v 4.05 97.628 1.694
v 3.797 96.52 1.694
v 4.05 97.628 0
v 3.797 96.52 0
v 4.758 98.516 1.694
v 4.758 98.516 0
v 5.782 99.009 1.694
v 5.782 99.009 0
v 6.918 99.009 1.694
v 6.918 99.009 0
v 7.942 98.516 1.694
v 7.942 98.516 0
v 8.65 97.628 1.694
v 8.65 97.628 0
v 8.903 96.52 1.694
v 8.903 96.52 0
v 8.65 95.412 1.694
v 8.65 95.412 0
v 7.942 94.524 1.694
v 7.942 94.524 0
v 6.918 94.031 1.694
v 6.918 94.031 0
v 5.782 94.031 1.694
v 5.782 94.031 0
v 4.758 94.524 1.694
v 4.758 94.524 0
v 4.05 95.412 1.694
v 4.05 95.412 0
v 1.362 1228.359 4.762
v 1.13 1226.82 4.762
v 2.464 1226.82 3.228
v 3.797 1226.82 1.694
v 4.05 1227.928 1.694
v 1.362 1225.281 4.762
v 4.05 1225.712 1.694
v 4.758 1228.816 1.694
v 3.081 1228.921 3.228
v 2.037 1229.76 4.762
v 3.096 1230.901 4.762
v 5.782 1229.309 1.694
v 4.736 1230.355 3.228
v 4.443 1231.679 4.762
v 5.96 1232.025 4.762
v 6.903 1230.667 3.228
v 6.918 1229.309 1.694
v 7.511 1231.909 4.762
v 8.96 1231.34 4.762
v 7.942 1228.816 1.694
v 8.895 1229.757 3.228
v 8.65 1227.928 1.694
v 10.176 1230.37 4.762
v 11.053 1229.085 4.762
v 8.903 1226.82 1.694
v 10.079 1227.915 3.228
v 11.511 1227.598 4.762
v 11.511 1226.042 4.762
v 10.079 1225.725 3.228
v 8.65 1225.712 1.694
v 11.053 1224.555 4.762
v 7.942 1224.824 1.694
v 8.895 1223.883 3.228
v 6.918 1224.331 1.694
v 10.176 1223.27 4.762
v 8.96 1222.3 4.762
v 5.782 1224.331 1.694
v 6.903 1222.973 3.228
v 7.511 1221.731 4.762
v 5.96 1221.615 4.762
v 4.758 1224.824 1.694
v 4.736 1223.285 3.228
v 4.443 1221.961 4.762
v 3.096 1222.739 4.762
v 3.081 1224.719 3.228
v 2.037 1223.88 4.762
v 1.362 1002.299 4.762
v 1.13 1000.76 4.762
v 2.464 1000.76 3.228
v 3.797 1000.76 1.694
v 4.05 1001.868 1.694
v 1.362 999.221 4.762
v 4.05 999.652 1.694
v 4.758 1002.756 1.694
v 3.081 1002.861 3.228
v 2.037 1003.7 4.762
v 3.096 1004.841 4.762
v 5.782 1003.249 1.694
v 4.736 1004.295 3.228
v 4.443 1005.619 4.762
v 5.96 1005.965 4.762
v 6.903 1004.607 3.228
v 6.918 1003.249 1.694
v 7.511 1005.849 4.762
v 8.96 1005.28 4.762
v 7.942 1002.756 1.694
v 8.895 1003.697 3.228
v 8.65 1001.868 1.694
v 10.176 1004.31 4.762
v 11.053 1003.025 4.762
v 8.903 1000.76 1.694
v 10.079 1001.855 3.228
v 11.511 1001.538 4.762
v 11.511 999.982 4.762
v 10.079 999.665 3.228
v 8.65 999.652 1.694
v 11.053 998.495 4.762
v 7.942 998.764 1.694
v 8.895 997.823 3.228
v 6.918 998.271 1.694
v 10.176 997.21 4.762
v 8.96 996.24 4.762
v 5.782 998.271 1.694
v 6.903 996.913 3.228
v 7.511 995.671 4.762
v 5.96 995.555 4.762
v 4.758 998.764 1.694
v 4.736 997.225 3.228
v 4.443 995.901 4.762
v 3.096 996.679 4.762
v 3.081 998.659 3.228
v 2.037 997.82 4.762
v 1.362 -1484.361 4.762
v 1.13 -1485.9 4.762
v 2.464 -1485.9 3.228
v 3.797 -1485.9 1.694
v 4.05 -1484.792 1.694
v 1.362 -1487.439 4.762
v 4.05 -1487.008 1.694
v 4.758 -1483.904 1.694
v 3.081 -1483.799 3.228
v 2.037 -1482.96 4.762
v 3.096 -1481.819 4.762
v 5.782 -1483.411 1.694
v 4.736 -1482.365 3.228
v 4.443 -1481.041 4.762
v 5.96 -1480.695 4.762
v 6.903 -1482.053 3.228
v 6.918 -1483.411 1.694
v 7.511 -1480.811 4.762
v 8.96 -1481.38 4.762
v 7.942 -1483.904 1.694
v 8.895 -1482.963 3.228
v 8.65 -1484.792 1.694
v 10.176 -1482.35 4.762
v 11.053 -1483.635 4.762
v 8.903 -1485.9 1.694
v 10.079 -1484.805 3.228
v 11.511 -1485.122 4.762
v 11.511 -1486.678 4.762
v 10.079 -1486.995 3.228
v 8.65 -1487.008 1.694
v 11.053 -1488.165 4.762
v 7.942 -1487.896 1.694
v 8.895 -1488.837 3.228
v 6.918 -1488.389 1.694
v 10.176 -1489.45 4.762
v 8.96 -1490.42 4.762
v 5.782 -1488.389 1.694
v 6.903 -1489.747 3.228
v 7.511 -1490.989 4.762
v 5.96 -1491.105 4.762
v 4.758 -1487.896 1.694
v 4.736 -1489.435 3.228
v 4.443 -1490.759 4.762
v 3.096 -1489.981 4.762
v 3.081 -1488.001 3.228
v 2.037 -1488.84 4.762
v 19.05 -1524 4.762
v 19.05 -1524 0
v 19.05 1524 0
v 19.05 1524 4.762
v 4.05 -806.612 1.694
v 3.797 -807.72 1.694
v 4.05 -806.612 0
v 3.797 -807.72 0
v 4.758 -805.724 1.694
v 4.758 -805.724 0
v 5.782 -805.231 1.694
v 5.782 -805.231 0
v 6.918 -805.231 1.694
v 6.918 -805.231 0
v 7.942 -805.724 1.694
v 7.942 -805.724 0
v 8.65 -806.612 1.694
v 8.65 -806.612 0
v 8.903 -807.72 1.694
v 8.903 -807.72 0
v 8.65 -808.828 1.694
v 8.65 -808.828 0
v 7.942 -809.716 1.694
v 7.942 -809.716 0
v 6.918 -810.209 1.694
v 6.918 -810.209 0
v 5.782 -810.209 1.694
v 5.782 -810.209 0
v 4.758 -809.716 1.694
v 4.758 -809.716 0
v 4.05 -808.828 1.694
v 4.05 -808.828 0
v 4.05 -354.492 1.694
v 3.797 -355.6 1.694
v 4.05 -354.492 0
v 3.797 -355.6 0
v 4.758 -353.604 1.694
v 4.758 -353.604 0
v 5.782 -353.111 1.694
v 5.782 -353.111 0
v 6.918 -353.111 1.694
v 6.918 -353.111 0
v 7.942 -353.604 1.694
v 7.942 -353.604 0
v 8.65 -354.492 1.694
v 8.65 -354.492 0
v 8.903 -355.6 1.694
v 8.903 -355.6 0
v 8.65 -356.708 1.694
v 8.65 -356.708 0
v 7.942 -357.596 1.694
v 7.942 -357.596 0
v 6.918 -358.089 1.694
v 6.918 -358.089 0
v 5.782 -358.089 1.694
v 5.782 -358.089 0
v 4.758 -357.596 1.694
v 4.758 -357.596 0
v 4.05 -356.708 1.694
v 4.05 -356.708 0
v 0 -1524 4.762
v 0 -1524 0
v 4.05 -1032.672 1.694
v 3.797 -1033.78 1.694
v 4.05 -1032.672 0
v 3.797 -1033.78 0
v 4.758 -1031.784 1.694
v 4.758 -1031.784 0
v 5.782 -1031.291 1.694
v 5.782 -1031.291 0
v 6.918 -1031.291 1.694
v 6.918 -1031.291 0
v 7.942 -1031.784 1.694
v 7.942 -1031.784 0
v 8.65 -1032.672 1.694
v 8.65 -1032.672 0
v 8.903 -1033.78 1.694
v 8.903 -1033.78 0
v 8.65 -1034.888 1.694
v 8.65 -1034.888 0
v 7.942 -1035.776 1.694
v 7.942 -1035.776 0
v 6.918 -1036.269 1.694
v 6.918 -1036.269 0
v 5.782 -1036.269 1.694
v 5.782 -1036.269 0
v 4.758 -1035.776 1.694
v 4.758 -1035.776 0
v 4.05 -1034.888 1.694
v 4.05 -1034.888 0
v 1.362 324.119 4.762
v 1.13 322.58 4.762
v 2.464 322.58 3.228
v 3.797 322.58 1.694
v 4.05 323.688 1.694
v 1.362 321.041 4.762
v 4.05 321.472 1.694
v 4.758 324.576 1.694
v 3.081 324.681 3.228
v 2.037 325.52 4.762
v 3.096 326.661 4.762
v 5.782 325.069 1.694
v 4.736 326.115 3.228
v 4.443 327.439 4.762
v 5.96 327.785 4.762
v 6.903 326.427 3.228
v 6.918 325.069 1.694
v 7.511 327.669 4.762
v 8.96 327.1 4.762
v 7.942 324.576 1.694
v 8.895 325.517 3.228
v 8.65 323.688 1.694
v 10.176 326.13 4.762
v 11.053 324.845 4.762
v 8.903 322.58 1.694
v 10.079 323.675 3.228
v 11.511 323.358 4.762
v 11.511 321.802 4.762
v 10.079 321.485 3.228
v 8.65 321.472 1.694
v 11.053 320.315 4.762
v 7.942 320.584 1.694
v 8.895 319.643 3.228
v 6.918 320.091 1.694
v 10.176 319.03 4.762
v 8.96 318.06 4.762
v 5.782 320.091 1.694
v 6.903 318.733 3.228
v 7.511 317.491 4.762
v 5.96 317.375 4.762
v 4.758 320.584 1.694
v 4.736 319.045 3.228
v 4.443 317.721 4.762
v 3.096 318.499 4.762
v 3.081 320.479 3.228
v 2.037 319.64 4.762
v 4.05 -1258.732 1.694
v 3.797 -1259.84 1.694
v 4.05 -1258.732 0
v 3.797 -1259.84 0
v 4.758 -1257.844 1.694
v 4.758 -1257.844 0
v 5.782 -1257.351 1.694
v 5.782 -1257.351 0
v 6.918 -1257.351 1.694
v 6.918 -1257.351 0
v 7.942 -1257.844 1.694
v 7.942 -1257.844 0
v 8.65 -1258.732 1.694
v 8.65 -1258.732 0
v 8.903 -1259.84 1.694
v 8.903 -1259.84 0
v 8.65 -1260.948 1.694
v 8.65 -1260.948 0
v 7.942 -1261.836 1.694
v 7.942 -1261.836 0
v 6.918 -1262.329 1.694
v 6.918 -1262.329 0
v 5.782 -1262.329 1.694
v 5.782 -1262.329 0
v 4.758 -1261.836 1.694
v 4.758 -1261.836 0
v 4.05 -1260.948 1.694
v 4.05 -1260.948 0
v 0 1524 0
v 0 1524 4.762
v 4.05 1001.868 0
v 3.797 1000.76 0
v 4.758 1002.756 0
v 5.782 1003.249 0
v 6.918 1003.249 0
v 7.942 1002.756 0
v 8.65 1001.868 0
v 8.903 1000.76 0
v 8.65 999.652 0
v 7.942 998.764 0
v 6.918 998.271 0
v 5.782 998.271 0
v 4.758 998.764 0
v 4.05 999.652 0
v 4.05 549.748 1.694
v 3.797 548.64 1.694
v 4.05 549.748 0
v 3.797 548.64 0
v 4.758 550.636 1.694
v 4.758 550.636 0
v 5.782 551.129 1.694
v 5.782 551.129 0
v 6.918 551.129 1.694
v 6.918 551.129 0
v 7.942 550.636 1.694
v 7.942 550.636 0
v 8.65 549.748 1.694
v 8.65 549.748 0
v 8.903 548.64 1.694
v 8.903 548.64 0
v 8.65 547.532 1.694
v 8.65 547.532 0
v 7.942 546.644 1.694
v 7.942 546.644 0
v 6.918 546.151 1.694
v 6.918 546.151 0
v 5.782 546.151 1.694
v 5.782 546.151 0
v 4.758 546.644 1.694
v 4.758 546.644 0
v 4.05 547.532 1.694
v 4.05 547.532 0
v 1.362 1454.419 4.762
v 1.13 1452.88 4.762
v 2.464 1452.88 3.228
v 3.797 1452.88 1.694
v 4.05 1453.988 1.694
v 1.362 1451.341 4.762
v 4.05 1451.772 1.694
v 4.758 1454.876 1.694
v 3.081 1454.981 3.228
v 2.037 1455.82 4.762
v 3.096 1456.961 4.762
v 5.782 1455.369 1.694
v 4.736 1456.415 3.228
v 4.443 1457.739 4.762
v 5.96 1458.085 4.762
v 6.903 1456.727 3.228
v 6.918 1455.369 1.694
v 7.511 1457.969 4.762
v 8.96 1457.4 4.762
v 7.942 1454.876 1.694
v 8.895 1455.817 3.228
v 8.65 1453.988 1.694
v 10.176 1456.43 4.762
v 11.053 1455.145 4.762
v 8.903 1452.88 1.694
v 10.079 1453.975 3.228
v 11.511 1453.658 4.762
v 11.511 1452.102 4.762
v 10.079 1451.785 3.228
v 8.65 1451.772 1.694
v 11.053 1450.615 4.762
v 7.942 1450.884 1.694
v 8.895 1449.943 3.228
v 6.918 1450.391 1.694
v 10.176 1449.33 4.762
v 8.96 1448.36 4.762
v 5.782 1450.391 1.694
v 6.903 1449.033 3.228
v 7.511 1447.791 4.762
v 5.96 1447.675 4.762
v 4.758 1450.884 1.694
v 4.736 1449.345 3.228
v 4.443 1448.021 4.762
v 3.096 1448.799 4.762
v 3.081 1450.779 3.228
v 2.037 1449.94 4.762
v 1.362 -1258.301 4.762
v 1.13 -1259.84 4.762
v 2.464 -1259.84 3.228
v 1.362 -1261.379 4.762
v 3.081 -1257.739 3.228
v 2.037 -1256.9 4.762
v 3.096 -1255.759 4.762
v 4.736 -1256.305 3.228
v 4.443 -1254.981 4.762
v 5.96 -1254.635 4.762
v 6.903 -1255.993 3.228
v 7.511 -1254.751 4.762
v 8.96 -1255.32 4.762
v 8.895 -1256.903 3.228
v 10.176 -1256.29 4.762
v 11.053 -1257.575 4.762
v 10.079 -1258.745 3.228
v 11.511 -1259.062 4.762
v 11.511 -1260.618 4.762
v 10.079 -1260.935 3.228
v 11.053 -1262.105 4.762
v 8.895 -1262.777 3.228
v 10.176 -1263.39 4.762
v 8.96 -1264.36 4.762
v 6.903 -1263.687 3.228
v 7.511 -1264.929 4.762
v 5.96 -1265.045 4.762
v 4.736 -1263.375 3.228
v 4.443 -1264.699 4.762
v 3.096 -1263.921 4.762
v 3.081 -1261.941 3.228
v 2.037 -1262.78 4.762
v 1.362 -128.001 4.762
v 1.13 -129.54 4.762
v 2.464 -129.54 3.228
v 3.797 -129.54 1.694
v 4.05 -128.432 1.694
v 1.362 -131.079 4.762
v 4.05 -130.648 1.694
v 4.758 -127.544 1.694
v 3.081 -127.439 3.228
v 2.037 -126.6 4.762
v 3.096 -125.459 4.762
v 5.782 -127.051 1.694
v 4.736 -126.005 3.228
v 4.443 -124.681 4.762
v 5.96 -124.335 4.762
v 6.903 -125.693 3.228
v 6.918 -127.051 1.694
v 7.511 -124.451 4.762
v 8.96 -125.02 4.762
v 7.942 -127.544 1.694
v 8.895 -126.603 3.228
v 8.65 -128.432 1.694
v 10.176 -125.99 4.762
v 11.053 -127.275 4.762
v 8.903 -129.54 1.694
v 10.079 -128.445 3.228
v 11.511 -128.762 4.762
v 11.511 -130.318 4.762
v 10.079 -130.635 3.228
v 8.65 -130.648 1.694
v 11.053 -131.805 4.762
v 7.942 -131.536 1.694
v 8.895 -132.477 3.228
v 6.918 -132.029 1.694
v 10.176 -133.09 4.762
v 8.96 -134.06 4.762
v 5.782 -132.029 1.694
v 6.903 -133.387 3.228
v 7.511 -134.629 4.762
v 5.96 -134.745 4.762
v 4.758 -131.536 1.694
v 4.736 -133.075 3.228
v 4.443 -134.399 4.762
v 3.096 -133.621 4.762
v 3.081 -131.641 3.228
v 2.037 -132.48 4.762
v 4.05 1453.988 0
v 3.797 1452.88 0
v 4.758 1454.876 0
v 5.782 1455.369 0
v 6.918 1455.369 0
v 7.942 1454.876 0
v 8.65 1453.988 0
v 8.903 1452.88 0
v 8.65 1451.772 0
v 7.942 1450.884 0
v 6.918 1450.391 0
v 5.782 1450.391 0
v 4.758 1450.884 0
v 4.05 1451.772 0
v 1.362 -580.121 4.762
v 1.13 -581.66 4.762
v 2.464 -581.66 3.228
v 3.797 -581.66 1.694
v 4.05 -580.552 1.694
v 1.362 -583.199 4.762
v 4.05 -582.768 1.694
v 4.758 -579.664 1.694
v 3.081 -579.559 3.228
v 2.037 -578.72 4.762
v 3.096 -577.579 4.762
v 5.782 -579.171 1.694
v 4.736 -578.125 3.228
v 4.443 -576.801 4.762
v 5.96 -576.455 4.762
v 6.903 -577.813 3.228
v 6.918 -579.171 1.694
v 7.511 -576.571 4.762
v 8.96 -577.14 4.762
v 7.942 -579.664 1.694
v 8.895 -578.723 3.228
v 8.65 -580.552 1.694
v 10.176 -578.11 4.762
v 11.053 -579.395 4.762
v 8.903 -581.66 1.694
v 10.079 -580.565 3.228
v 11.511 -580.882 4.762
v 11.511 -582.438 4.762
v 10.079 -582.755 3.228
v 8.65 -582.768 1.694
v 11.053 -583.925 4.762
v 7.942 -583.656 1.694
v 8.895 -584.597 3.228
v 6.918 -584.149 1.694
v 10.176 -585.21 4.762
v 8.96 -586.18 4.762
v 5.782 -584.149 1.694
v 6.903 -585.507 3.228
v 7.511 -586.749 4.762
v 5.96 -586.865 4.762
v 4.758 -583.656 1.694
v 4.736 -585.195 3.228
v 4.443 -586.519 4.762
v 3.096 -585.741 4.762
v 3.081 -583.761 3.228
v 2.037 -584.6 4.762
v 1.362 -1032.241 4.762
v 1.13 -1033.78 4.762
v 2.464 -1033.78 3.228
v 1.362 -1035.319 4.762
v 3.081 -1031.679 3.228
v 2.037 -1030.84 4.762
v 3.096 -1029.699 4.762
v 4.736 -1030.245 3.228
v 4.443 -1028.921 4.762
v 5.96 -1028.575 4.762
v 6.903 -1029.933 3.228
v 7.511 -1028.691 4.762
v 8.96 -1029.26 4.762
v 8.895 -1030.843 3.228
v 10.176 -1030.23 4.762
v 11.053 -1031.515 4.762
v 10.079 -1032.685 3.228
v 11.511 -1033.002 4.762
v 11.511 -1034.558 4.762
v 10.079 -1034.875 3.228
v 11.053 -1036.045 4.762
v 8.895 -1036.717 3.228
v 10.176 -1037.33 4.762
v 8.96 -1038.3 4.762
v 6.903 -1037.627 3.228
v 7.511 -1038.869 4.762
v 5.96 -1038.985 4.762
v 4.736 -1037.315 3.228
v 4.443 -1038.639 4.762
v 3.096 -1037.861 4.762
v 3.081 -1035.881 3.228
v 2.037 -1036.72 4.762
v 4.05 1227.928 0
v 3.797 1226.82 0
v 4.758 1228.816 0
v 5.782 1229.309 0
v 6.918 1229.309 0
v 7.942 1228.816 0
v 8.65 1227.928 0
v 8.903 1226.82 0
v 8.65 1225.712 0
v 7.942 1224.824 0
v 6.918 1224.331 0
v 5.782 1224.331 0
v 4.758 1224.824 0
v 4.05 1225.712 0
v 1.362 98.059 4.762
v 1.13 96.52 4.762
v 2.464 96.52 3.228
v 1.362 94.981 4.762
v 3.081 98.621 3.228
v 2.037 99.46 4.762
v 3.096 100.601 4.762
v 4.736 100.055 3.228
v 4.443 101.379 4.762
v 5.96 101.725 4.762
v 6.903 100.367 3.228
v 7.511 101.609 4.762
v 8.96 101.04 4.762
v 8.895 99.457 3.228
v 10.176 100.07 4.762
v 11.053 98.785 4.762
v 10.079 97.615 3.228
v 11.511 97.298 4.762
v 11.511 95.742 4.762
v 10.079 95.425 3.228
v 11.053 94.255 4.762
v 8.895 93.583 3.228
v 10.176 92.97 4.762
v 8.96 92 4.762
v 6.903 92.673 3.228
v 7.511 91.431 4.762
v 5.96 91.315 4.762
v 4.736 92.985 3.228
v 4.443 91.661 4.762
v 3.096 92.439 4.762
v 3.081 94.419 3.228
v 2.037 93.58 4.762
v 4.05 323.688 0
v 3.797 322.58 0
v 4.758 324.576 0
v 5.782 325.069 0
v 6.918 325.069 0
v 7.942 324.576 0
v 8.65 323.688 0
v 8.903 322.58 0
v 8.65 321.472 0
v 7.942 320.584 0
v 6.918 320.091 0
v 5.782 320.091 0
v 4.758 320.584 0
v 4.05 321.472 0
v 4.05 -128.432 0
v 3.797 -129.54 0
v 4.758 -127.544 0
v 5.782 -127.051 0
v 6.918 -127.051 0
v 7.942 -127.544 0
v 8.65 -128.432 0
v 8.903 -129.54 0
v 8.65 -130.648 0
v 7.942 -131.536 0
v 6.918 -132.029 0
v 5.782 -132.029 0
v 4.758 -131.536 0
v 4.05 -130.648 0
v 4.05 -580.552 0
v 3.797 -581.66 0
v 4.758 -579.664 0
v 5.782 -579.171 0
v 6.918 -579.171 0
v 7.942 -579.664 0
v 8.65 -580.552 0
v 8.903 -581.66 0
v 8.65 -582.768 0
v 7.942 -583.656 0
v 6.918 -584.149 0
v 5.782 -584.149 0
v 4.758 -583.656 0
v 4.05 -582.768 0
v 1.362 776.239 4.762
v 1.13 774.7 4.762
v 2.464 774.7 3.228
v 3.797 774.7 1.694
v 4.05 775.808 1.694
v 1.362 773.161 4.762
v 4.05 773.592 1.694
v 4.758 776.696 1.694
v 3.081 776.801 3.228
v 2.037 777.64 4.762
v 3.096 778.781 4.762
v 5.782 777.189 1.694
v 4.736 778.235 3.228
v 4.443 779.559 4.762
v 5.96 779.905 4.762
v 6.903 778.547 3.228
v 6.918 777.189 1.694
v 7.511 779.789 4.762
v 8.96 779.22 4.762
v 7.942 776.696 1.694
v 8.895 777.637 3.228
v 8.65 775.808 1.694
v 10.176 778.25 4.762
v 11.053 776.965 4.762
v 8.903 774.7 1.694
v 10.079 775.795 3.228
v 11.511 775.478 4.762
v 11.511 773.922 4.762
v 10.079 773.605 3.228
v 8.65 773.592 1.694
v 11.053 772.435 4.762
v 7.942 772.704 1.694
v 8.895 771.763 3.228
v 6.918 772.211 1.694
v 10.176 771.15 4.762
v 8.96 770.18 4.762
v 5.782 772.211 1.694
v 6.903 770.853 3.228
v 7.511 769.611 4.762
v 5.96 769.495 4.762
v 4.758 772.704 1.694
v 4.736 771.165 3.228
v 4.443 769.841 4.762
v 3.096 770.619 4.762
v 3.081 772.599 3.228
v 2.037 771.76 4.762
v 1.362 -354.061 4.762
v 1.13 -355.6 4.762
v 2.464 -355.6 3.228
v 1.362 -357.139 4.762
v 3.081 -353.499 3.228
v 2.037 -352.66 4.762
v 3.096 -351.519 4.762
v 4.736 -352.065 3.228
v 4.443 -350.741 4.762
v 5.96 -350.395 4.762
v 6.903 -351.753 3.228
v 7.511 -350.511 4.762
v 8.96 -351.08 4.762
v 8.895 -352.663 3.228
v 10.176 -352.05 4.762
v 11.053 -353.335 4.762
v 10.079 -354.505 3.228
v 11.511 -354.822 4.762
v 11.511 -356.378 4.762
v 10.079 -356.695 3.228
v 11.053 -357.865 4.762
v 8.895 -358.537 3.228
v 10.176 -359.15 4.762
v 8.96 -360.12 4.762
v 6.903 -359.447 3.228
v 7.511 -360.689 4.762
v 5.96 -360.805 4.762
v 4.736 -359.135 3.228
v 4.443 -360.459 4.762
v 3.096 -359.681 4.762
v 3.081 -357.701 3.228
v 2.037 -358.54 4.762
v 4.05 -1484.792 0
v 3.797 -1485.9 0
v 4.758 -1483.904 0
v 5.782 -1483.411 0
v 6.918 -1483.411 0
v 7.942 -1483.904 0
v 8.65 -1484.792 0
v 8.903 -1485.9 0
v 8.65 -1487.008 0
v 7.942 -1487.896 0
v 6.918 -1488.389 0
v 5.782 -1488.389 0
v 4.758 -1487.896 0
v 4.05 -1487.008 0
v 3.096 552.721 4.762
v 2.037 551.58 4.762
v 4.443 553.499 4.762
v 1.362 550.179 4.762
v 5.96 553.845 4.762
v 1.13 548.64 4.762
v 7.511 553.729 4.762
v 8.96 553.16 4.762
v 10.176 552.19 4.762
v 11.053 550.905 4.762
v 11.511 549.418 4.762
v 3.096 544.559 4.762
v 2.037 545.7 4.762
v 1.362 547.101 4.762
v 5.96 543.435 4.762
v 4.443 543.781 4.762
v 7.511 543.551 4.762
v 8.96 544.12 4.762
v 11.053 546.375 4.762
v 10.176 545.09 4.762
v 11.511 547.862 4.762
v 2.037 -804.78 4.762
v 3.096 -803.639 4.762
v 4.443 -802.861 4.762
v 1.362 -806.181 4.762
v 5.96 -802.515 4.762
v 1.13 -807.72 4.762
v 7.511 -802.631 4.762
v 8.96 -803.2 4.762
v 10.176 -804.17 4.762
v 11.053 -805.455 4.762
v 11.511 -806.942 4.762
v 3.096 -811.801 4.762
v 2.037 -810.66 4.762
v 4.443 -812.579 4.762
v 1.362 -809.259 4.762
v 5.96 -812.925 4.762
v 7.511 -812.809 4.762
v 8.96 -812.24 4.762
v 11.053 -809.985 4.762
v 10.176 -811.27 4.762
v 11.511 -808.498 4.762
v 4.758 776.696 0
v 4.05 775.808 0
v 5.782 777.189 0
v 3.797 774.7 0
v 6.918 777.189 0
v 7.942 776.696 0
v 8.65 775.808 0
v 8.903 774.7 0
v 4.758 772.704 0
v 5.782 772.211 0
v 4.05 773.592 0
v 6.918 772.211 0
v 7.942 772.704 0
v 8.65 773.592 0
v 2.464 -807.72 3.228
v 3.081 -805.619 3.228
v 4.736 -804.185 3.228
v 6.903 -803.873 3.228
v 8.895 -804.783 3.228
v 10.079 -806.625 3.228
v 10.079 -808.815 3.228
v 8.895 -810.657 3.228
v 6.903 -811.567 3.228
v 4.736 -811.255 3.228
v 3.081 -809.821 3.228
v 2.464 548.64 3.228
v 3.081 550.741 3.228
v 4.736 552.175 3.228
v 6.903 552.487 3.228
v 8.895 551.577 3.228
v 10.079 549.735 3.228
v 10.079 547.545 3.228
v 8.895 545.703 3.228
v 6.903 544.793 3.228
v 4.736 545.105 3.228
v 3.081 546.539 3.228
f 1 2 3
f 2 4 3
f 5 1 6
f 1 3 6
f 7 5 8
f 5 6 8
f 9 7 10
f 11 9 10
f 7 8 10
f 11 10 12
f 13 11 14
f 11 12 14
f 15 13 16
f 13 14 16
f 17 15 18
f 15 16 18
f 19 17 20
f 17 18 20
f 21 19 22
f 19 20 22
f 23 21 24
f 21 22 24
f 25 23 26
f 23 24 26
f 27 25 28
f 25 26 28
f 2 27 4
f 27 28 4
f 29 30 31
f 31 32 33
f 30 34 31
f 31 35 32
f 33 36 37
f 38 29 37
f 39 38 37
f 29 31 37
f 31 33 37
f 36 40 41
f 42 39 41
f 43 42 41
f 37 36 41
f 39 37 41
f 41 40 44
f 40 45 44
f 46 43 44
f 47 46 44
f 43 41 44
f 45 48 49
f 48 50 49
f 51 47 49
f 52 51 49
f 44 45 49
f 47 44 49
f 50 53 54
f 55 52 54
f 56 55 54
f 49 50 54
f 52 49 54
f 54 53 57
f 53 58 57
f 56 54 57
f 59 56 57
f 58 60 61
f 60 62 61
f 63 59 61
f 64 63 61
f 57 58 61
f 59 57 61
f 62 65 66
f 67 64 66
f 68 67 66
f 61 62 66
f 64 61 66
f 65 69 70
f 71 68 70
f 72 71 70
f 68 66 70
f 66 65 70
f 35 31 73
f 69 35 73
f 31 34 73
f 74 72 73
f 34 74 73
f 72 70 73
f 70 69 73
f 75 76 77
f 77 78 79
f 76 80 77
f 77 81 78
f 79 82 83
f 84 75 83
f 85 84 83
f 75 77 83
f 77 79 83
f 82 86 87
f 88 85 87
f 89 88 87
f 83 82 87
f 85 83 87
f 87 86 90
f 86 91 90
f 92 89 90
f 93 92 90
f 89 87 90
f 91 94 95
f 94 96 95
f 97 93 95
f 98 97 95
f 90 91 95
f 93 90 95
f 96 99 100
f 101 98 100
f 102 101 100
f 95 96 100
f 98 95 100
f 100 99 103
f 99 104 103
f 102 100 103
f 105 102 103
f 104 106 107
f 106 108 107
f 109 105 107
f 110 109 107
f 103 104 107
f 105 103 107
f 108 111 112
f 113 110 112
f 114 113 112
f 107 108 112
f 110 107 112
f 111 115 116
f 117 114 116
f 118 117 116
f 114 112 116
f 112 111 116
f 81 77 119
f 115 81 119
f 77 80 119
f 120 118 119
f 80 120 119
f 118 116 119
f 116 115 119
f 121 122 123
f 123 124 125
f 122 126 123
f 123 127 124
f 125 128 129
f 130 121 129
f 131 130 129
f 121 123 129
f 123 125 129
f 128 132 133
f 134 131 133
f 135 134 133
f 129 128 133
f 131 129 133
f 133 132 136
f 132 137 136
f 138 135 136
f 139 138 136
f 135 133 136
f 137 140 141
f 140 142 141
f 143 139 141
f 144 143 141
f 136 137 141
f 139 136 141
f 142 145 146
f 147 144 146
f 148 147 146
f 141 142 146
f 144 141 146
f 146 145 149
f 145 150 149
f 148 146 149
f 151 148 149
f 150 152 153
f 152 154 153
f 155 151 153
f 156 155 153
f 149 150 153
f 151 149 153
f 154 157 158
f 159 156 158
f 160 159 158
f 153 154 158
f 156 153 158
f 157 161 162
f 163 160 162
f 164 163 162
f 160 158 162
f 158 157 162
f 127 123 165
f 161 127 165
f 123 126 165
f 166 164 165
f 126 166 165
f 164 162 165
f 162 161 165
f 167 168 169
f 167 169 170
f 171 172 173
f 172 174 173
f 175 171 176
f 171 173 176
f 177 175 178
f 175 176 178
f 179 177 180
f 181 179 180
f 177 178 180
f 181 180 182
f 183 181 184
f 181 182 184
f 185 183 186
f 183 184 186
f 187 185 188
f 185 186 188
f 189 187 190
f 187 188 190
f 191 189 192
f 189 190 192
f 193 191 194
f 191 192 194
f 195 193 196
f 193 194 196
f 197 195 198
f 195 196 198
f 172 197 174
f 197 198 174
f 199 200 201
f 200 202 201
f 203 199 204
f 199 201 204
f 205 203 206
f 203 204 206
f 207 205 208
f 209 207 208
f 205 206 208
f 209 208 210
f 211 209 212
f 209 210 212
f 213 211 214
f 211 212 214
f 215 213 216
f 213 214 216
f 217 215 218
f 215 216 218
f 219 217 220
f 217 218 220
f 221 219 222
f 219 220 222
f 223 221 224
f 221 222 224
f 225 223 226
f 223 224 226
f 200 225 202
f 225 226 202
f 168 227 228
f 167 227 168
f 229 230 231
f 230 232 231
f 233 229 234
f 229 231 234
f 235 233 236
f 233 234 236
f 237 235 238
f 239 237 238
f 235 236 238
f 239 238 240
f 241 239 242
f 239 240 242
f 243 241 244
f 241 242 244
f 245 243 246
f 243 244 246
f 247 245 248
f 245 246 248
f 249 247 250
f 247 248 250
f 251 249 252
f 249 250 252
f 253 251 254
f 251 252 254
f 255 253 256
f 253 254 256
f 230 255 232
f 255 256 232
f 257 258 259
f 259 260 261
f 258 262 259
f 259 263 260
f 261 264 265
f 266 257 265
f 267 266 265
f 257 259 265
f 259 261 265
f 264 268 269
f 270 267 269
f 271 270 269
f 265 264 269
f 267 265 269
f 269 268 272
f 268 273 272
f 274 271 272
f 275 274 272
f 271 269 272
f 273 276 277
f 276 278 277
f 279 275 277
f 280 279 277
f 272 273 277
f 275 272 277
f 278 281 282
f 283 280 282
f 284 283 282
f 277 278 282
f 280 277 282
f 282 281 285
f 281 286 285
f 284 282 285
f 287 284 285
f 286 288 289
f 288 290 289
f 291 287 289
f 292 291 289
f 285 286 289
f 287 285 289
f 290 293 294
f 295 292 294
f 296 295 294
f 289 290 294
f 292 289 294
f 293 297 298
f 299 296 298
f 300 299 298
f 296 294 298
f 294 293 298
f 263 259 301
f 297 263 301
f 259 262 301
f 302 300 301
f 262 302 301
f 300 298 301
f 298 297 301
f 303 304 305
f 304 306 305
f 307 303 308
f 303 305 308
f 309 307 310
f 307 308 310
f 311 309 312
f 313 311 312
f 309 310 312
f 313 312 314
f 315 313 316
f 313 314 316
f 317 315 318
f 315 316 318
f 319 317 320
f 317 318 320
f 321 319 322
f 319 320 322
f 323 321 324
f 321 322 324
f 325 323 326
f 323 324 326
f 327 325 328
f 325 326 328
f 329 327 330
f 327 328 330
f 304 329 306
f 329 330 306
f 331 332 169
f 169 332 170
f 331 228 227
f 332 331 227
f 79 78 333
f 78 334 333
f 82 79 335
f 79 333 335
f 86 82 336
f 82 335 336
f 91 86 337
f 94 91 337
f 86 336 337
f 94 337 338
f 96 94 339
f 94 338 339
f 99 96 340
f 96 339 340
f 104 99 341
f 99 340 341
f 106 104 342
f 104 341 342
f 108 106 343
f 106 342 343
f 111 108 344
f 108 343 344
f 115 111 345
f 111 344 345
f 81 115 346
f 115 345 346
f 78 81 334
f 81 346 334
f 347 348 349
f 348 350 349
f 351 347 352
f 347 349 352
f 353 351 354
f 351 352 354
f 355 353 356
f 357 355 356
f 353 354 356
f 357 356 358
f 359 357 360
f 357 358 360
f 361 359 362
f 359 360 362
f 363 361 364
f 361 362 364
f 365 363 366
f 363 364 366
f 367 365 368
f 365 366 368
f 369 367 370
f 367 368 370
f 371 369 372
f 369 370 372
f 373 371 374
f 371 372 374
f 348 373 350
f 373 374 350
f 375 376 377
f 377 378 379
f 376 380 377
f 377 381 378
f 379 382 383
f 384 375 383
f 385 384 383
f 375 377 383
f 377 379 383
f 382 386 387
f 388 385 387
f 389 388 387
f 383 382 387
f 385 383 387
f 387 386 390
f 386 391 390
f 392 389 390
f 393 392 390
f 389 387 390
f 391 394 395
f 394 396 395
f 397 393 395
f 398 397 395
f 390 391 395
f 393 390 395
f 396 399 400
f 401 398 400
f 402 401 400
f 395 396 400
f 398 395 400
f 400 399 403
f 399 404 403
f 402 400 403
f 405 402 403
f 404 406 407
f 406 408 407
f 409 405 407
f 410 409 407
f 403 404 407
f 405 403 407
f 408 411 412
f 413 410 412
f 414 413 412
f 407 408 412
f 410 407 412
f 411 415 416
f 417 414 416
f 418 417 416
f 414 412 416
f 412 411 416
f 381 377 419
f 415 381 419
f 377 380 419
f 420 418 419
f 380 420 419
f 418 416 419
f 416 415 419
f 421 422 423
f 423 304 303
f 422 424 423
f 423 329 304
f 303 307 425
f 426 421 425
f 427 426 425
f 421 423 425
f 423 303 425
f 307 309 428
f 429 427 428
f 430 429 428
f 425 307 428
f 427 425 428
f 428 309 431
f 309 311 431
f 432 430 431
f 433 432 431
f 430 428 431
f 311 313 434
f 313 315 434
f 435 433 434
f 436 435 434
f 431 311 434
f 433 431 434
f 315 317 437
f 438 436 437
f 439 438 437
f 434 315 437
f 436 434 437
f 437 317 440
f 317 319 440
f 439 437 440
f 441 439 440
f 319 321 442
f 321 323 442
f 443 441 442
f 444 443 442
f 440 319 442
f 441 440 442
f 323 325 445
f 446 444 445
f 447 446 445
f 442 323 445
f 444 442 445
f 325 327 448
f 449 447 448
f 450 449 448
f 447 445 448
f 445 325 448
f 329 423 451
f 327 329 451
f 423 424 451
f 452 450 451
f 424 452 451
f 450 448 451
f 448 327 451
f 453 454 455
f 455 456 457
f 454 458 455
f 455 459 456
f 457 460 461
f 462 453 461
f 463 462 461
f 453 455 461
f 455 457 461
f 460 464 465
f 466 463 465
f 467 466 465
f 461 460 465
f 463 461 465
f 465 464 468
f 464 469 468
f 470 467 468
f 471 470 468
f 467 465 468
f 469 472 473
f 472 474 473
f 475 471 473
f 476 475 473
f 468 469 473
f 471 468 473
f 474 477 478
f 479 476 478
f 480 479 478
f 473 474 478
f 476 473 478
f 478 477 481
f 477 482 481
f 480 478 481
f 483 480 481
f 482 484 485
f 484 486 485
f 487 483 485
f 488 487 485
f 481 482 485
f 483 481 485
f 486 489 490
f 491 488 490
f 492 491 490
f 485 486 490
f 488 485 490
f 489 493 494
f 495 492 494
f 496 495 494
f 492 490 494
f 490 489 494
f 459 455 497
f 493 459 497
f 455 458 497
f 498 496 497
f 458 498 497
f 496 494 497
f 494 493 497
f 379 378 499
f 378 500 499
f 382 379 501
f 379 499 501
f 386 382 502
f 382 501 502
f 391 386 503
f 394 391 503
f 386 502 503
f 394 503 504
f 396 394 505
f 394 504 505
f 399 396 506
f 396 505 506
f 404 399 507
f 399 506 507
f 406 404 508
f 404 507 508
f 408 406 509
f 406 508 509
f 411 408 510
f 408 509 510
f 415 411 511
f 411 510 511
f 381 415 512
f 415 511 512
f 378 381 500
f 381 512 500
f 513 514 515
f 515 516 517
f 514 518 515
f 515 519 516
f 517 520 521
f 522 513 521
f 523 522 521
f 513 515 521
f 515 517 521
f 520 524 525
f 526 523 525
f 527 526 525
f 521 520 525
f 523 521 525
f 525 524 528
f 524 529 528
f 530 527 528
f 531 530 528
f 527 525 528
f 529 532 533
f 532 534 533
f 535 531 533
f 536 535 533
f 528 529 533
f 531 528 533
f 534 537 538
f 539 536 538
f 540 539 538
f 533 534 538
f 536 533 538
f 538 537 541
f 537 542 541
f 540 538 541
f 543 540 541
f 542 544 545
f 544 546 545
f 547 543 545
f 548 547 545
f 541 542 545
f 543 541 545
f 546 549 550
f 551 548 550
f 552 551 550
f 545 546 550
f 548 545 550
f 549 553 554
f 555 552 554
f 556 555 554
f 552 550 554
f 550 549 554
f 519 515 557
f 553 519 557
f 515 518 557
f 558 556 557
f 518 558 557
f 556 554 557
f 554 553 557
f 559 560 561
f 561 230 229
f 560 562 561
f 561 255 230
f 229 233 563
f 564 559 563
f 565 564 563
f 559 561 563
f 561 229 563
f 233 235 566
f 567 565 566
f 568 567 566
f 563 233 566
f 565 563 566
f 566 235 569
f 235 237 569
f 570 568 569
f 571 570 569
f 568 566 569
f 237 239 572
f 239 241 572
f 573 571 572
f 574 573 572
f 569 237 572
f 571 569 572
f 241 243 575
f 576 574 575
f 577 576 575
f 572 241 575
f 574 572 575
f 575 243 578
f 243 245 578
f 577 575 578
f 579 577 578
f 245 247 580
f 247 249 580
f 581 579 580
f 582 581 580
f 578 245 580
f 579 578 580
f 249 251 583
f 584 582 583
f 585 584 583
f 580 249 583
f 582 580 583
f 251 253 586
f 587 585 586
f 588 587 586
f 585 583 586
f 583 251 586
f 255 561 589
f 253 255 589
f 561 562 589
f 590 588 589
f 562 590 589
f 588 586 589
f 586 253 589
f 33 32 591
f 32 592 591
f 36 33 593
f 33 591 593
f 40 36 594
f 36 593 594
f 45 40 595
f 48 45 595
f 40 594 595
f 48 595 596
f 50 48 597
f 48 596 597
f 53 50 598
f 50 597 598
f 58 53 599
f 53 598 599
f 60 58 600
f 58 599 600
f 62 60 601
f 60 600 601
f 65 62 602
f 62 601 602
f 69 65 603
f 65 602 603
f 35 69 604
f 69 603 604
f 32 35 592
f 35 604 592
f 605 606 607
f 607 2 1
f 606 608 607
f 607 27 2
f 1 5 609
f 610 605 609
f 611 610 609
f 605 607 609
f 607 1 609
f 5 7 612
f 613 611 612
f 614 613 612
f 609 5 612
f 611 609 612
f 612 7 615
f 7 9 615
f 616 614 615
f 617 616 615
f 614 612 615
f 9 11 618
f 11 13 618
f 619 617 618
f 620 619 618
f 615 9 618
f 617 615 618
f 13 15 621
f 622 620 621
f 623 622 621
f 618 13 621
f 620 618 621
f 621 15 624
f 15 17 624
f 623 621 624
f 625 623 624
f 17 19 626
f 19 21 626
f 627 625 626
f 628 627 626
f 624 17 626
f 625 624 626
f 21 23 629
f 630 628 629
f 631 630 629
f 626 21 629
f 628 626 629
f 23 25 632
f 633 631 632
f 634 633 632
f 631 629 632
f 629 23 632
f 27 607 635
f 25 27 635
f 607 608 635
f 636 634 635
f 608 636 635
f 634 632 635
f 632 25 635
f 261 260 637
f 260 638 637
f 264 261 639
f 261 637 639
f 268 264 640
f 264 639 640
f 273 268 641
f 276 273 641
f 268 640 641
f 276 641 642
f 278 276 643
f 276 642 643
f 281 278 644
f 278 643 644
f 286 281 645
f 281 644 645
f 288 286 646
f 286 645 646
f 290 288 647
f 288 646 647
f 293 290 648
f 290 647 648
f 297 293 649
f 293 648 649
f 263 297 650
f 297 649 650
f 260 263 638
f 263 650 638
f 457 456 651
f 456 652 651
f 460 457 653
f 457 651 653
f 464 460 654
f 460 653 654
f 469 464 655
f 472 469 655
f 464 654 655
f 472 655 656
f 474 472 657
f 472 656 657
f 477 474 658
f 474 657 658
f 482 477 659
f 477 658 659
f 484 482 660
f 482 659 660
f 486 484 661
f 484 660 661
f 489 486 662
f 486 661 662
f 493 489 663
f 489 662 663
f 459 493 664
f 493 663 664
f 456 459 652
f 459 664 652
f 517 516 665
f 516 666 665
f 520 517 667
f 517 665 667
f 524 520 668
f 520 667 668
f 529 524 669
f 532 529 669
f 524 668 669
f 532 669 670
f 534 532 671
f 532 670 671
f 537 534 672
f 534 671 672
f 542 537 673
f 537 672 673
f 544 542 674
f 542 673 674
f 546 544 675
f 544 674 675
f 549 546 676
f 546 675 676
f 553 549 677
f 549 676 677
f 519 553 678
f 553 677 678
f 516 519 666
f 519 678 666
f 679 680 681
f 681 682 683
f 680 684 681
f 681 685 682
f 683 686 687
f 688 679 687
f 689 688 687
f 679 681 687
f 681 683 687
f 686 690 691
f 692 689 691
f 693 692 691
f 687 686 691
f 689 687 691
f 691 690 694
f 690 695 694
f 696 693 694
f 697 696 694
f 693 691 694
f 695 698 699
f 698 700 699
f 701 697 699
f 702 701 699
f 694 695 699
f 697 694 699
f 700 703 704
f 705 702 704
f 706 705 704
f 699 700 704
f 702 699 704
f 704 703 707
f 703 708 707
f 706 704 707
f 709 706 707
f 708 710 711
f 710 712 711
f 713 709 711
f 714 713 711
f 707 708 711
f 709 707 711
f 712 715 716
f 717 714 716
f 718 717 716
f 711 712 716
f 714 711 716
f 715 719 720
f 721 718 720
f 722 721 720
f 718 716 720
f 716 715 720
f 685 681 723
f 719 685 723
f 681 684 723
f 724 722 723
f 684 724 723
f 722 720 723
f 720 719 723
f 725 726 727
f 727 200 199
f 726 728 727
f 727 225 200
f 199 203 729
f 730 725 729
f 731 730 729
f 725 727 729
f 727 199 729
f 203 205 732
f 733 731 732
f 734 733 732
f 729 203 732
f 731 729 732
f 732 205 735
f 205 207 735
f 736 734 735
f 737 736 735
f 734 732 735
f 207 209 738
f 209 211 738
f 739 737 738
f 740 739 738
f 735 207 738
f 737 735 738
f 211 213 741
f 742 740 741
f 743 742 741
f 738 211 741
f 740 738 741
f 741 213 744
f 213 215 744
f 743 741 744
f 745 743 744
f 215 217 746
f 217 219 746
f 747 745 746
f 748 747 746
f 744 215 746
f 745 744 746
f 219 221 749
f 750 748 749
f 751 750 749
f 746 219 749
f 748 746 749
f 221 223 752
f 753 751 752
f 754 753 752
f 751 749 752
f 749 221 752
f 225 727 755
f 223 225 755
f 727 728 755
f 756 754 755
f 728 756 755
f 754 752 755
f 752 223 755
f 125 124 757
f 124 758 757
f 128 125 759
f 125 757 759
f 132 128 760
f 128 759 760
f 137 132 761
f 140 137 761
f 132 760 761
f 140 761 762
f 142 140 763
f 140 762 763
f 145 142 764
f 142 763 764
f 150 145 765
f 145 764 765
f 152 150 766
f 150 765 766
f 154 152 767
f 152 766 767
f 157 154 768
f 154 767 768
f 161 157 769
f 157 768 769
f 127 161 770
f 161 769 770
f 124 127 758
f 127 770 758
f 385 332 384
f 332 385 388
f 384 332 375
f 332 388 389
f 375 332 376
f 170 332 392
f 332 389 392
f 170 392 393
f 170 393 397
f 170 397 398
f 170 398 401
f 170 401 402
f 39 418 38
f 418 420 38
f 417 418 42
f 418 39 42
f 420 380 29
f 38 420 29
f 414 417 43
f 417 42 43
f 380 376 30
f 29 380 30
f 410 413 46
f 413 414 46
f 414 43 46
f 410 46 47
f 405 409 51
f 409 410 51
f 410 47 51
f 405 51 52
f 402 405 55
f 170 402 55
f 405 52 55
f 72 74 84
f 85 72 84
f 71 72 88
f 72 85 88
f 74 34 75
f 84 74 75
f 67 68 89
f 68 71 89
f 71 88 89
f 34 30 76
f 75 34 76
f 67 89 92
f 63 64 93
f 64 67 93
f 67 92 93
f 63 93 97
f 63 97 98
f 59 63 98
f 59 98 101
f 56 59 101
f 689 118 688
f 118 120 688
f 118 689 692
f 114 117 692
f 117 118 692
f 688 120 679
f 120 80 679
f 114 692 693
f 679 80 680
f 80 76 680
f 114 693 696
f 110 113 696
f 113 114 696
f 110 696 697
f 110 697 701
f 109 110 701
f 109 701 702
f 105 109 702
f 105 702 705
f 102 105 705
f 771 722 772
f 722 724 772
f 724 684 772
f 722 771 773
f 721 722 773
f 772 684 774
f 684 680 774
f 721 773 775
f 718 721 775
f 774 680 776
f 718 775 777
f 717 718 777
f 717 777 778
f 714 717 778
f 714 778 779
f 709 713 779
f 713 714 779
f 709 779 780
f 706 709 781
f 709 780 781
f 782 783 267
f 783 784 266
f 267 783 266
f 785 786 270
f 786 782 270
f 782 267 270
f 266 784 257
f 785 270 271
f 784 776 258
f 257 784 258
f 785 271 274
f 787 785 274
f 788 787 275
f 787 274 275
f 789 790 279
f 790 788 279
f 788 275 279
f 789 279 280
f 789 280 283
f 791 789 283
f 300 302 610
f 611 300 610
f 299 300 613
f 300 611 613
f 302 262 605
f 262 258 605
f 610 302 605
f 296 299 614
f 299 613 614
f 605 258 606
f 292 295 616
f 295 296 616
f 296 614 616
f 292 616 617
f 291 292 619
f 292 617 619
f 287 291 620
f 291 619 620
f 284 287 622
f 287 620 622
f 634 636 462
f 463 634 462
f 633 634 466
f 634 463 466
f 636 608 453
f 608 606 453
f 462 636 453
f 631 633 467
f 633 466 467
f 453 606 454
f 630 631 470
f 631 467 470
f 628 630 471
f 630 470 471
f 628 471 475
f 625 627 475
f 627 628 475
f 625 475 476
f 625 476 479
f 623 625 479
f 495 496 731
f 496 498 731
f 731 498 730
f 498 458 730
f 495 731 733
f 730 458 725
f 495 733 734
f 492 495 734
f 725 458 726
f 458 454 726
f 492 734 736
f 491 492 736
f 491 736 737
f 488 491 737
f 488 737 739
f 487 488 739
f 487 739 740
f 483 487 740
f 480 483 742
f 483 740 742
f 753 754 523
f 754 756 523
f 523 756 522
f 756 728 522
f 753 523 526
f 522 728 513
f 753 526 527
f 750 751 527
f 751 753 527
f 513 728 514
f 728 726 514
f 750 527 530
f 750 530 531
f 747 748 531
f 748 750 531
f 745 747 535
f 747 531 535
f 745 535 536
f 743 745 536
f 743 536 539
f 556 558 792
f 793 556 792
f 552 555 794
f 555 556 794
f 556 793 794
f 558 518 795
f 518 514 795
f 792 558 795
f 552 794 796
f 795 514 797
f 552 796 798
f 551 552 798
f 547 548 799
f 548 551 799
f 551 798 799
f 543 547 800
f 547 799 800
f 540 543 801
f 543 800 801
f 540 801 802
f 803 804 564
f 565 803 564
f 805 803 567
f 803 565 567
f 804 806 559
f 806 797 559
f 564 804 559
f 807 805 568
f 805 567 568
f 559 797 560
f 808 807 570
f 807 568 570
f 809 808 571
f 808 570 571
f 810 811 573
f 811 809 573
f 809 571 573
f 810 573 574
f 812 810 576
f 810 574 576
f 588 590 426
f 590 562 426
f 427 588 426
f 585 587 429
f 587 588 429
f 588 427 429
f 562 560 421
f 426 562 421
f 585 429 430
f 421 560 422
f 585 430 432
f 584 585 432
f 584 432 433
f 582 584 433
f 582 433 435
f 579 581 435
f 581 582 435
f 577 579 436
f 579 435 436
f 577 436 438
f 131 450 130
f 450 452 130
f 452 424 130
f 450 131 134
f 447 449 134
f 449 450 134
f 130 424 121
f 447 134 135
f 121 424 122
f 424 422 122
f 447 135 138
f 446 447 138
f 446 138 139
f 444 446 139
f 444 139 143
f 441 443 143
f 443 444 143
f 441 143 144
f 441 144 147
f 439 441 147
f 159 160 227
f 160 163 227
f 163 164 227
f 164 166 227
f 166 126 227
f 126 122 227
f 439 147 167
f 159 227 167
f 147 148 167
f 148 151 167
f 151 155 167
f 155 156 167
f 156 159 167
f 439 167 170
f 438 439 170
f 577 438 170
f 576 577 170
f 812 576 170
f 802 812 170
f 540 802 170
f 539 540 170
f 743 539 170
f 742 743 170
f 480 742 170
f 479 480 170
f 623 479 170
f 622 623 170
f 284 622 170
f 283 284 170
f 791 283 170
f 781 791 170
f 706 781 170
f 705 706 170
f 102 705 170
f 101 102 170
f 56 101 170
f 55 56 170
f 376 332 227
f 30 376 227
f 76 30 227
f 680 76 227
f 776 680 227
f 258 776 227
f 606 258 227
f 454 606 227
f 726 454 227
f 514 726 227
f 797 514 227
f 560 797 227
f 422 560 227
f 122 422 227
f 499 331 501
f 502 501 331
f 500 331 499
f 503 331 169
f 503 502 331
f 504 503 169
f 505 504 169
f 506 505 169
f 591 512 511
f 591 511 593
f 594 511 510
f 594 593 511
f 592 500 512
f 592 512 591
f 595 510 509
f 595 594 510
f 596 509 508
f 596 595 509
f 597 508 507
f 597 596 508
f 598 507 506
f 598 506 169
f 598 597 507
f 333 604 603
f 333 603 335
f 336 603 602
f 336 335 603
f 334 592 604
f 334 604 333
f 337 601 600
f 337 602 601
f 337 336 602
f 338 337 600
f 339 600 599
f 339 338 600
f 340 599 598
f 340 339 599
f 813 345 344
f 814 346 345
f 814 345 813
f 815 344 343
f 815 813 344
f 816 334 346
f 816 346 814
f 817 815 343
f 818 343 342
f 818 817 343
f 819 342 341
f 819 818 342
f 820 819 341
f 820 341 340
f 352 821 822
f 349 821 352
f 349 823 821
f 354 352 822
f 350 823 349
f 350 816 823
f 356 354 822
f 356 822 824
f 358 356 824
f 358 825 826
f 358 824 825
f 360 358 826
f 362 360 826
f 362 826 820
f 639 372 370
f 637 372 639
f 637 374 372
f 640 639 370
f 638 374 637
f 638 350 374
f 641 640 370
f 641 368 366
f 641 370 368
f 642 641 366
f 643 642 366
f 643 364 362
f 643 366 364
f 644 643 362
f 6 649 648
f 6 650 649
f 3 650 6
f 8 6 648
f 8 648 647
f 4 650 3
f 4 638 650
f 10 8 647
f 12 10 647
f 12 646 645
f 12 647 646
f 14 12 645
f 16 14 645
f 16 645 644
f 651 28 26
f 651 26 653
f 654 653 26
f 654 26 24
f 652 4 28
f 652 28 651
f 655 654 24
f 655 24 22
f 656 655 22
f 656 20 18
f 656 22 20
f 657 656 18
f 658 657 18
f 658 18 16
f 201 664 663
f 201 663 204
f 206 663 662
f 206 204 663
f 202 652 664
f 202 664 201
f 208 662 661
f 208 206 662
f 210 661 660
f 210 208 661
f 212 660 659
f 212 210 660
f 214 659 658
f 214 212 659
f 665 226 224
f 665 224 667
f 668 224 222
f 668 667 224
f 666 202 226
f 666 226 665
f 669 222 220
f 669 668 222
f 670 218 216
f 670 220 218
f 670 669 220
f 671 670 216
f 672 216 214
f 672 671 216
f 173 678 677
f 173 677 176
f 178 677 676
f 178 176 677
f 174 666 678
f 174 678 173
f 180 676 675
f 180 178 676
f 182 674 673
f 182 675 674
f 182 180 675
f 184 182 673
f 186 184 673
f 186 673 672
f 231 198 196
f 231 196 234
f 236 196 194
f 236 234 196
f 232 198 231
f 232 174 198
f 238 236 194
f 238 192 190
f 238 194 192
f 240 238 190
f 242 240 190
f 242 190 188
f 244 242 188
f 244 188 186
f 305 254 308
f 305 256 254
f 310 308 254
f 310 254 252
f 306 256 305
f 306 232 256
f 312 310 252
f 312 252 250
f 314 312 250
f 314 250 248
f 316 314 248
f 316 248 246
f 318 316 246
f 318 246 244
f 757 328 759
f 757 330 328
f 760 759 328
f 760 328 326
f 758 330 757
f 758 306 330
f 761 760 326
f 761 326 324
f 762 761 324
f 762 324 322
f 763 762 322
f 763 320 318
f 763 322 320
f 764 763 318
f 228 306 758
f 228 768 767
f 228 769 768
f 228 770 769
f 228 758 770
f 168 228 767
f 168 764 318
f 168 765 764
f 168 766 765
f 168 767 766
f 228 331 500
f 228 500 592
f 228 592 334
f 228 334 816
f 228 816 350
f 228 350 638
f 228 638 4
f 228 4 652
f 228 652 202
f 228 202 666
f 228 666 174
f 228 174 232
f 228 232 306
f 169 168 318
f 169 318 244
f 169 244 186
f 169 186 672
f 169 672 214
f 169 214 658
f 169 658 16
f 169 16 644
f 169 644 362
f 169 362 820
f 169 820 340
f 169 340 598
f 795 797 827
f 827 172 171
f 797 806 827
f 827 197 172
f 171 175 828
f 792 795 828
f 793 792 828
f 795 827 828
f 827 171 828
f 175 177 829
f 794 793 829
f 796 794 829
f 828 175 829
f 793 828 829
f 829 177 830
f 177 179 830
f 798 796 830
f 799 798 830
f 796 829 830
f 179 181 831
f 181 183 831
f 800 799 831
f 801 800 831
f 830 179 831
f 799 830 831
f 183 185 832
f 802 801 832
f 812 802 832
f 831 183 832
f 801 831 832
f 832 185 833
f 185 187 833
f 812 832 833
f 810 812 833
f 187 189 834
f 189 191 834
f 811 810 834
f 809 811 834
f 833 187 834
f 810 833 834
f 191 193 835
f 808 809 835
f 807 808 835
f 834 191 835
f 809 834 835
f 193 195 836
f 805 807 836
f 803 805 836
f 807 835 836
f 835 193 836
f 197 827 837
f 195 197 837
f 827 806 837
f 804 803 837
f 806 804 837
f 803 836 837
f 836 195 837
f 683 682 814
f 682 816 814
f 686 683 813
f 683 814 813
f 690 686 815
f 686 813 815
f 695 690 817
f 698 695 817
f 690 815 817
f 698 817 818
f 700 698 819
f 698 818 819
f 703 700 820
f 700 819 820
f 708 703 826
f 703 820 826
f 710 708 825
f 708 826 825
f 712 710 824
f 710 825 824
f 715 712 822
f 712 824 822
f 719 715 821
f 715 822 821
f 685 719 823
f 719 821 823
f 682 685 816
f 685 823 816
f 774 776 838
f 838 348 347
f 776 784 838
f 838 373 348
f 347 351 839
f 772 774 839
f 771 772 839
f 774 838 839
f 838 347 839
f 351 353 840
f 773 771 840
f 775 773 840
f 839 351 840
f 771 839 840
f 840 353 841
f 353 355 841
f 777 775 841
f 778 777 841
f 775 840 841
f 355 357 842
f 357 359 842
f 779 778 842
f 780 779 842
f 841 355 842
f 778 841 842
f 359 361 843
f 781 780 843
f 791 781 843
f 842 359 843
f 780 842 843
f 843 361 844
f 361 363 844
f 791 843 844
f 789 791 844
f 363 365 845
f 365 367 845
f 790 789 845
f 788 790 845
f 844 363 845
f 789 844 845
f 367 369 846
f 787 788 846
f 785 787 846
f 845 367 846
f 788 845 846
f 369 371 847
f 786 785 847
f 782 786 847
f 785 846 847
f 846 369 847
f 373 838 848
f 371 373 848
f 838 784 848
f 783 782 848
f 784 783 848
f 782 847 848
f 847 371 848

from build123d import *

# Parameters (mm, degrees)
F0_W           = 19.05
F0_H           = 4.7625
F1_DEPTH       = 1524
F3_D           = 5.1054
F3_CSINK_D     = 10.4394
F3_CSINK_ANGLE = 82


with BuildPart() as f1:
    # F0 (on Front) → F1 (new body, symmetric)
    with BuildSketch(Plane.XZ):
        with Locations((9.525, 2.38125)):
            Rectangle(F0_W, F0_H)
    extrude(amount=F1_DEPTH, both=True)

    # F3 (through all)
    with Locations(Plane.XY.offset(4.7625)):
        with Locations((6.35, 1452.88), (6.35, 1226.82), (6.35, 774.7), (6.35, 1000.76), (6.35, -807.72), (6.35, -581.66), (6.35, -355.6), (6.35, 548.64), (6.35, -129.54), (6.35, 96.52), (6.35, 322.58), (31.75, -1485.9), (6.35, -1485.9), (6.35, -1259.84), (6.35, -1033.78)):
            CounterSinkHole(F3_D / 2, F3_CSINK_D / 2, counter_sink_angle=F3_CSINK_ANGLE)


solid = f1.part
